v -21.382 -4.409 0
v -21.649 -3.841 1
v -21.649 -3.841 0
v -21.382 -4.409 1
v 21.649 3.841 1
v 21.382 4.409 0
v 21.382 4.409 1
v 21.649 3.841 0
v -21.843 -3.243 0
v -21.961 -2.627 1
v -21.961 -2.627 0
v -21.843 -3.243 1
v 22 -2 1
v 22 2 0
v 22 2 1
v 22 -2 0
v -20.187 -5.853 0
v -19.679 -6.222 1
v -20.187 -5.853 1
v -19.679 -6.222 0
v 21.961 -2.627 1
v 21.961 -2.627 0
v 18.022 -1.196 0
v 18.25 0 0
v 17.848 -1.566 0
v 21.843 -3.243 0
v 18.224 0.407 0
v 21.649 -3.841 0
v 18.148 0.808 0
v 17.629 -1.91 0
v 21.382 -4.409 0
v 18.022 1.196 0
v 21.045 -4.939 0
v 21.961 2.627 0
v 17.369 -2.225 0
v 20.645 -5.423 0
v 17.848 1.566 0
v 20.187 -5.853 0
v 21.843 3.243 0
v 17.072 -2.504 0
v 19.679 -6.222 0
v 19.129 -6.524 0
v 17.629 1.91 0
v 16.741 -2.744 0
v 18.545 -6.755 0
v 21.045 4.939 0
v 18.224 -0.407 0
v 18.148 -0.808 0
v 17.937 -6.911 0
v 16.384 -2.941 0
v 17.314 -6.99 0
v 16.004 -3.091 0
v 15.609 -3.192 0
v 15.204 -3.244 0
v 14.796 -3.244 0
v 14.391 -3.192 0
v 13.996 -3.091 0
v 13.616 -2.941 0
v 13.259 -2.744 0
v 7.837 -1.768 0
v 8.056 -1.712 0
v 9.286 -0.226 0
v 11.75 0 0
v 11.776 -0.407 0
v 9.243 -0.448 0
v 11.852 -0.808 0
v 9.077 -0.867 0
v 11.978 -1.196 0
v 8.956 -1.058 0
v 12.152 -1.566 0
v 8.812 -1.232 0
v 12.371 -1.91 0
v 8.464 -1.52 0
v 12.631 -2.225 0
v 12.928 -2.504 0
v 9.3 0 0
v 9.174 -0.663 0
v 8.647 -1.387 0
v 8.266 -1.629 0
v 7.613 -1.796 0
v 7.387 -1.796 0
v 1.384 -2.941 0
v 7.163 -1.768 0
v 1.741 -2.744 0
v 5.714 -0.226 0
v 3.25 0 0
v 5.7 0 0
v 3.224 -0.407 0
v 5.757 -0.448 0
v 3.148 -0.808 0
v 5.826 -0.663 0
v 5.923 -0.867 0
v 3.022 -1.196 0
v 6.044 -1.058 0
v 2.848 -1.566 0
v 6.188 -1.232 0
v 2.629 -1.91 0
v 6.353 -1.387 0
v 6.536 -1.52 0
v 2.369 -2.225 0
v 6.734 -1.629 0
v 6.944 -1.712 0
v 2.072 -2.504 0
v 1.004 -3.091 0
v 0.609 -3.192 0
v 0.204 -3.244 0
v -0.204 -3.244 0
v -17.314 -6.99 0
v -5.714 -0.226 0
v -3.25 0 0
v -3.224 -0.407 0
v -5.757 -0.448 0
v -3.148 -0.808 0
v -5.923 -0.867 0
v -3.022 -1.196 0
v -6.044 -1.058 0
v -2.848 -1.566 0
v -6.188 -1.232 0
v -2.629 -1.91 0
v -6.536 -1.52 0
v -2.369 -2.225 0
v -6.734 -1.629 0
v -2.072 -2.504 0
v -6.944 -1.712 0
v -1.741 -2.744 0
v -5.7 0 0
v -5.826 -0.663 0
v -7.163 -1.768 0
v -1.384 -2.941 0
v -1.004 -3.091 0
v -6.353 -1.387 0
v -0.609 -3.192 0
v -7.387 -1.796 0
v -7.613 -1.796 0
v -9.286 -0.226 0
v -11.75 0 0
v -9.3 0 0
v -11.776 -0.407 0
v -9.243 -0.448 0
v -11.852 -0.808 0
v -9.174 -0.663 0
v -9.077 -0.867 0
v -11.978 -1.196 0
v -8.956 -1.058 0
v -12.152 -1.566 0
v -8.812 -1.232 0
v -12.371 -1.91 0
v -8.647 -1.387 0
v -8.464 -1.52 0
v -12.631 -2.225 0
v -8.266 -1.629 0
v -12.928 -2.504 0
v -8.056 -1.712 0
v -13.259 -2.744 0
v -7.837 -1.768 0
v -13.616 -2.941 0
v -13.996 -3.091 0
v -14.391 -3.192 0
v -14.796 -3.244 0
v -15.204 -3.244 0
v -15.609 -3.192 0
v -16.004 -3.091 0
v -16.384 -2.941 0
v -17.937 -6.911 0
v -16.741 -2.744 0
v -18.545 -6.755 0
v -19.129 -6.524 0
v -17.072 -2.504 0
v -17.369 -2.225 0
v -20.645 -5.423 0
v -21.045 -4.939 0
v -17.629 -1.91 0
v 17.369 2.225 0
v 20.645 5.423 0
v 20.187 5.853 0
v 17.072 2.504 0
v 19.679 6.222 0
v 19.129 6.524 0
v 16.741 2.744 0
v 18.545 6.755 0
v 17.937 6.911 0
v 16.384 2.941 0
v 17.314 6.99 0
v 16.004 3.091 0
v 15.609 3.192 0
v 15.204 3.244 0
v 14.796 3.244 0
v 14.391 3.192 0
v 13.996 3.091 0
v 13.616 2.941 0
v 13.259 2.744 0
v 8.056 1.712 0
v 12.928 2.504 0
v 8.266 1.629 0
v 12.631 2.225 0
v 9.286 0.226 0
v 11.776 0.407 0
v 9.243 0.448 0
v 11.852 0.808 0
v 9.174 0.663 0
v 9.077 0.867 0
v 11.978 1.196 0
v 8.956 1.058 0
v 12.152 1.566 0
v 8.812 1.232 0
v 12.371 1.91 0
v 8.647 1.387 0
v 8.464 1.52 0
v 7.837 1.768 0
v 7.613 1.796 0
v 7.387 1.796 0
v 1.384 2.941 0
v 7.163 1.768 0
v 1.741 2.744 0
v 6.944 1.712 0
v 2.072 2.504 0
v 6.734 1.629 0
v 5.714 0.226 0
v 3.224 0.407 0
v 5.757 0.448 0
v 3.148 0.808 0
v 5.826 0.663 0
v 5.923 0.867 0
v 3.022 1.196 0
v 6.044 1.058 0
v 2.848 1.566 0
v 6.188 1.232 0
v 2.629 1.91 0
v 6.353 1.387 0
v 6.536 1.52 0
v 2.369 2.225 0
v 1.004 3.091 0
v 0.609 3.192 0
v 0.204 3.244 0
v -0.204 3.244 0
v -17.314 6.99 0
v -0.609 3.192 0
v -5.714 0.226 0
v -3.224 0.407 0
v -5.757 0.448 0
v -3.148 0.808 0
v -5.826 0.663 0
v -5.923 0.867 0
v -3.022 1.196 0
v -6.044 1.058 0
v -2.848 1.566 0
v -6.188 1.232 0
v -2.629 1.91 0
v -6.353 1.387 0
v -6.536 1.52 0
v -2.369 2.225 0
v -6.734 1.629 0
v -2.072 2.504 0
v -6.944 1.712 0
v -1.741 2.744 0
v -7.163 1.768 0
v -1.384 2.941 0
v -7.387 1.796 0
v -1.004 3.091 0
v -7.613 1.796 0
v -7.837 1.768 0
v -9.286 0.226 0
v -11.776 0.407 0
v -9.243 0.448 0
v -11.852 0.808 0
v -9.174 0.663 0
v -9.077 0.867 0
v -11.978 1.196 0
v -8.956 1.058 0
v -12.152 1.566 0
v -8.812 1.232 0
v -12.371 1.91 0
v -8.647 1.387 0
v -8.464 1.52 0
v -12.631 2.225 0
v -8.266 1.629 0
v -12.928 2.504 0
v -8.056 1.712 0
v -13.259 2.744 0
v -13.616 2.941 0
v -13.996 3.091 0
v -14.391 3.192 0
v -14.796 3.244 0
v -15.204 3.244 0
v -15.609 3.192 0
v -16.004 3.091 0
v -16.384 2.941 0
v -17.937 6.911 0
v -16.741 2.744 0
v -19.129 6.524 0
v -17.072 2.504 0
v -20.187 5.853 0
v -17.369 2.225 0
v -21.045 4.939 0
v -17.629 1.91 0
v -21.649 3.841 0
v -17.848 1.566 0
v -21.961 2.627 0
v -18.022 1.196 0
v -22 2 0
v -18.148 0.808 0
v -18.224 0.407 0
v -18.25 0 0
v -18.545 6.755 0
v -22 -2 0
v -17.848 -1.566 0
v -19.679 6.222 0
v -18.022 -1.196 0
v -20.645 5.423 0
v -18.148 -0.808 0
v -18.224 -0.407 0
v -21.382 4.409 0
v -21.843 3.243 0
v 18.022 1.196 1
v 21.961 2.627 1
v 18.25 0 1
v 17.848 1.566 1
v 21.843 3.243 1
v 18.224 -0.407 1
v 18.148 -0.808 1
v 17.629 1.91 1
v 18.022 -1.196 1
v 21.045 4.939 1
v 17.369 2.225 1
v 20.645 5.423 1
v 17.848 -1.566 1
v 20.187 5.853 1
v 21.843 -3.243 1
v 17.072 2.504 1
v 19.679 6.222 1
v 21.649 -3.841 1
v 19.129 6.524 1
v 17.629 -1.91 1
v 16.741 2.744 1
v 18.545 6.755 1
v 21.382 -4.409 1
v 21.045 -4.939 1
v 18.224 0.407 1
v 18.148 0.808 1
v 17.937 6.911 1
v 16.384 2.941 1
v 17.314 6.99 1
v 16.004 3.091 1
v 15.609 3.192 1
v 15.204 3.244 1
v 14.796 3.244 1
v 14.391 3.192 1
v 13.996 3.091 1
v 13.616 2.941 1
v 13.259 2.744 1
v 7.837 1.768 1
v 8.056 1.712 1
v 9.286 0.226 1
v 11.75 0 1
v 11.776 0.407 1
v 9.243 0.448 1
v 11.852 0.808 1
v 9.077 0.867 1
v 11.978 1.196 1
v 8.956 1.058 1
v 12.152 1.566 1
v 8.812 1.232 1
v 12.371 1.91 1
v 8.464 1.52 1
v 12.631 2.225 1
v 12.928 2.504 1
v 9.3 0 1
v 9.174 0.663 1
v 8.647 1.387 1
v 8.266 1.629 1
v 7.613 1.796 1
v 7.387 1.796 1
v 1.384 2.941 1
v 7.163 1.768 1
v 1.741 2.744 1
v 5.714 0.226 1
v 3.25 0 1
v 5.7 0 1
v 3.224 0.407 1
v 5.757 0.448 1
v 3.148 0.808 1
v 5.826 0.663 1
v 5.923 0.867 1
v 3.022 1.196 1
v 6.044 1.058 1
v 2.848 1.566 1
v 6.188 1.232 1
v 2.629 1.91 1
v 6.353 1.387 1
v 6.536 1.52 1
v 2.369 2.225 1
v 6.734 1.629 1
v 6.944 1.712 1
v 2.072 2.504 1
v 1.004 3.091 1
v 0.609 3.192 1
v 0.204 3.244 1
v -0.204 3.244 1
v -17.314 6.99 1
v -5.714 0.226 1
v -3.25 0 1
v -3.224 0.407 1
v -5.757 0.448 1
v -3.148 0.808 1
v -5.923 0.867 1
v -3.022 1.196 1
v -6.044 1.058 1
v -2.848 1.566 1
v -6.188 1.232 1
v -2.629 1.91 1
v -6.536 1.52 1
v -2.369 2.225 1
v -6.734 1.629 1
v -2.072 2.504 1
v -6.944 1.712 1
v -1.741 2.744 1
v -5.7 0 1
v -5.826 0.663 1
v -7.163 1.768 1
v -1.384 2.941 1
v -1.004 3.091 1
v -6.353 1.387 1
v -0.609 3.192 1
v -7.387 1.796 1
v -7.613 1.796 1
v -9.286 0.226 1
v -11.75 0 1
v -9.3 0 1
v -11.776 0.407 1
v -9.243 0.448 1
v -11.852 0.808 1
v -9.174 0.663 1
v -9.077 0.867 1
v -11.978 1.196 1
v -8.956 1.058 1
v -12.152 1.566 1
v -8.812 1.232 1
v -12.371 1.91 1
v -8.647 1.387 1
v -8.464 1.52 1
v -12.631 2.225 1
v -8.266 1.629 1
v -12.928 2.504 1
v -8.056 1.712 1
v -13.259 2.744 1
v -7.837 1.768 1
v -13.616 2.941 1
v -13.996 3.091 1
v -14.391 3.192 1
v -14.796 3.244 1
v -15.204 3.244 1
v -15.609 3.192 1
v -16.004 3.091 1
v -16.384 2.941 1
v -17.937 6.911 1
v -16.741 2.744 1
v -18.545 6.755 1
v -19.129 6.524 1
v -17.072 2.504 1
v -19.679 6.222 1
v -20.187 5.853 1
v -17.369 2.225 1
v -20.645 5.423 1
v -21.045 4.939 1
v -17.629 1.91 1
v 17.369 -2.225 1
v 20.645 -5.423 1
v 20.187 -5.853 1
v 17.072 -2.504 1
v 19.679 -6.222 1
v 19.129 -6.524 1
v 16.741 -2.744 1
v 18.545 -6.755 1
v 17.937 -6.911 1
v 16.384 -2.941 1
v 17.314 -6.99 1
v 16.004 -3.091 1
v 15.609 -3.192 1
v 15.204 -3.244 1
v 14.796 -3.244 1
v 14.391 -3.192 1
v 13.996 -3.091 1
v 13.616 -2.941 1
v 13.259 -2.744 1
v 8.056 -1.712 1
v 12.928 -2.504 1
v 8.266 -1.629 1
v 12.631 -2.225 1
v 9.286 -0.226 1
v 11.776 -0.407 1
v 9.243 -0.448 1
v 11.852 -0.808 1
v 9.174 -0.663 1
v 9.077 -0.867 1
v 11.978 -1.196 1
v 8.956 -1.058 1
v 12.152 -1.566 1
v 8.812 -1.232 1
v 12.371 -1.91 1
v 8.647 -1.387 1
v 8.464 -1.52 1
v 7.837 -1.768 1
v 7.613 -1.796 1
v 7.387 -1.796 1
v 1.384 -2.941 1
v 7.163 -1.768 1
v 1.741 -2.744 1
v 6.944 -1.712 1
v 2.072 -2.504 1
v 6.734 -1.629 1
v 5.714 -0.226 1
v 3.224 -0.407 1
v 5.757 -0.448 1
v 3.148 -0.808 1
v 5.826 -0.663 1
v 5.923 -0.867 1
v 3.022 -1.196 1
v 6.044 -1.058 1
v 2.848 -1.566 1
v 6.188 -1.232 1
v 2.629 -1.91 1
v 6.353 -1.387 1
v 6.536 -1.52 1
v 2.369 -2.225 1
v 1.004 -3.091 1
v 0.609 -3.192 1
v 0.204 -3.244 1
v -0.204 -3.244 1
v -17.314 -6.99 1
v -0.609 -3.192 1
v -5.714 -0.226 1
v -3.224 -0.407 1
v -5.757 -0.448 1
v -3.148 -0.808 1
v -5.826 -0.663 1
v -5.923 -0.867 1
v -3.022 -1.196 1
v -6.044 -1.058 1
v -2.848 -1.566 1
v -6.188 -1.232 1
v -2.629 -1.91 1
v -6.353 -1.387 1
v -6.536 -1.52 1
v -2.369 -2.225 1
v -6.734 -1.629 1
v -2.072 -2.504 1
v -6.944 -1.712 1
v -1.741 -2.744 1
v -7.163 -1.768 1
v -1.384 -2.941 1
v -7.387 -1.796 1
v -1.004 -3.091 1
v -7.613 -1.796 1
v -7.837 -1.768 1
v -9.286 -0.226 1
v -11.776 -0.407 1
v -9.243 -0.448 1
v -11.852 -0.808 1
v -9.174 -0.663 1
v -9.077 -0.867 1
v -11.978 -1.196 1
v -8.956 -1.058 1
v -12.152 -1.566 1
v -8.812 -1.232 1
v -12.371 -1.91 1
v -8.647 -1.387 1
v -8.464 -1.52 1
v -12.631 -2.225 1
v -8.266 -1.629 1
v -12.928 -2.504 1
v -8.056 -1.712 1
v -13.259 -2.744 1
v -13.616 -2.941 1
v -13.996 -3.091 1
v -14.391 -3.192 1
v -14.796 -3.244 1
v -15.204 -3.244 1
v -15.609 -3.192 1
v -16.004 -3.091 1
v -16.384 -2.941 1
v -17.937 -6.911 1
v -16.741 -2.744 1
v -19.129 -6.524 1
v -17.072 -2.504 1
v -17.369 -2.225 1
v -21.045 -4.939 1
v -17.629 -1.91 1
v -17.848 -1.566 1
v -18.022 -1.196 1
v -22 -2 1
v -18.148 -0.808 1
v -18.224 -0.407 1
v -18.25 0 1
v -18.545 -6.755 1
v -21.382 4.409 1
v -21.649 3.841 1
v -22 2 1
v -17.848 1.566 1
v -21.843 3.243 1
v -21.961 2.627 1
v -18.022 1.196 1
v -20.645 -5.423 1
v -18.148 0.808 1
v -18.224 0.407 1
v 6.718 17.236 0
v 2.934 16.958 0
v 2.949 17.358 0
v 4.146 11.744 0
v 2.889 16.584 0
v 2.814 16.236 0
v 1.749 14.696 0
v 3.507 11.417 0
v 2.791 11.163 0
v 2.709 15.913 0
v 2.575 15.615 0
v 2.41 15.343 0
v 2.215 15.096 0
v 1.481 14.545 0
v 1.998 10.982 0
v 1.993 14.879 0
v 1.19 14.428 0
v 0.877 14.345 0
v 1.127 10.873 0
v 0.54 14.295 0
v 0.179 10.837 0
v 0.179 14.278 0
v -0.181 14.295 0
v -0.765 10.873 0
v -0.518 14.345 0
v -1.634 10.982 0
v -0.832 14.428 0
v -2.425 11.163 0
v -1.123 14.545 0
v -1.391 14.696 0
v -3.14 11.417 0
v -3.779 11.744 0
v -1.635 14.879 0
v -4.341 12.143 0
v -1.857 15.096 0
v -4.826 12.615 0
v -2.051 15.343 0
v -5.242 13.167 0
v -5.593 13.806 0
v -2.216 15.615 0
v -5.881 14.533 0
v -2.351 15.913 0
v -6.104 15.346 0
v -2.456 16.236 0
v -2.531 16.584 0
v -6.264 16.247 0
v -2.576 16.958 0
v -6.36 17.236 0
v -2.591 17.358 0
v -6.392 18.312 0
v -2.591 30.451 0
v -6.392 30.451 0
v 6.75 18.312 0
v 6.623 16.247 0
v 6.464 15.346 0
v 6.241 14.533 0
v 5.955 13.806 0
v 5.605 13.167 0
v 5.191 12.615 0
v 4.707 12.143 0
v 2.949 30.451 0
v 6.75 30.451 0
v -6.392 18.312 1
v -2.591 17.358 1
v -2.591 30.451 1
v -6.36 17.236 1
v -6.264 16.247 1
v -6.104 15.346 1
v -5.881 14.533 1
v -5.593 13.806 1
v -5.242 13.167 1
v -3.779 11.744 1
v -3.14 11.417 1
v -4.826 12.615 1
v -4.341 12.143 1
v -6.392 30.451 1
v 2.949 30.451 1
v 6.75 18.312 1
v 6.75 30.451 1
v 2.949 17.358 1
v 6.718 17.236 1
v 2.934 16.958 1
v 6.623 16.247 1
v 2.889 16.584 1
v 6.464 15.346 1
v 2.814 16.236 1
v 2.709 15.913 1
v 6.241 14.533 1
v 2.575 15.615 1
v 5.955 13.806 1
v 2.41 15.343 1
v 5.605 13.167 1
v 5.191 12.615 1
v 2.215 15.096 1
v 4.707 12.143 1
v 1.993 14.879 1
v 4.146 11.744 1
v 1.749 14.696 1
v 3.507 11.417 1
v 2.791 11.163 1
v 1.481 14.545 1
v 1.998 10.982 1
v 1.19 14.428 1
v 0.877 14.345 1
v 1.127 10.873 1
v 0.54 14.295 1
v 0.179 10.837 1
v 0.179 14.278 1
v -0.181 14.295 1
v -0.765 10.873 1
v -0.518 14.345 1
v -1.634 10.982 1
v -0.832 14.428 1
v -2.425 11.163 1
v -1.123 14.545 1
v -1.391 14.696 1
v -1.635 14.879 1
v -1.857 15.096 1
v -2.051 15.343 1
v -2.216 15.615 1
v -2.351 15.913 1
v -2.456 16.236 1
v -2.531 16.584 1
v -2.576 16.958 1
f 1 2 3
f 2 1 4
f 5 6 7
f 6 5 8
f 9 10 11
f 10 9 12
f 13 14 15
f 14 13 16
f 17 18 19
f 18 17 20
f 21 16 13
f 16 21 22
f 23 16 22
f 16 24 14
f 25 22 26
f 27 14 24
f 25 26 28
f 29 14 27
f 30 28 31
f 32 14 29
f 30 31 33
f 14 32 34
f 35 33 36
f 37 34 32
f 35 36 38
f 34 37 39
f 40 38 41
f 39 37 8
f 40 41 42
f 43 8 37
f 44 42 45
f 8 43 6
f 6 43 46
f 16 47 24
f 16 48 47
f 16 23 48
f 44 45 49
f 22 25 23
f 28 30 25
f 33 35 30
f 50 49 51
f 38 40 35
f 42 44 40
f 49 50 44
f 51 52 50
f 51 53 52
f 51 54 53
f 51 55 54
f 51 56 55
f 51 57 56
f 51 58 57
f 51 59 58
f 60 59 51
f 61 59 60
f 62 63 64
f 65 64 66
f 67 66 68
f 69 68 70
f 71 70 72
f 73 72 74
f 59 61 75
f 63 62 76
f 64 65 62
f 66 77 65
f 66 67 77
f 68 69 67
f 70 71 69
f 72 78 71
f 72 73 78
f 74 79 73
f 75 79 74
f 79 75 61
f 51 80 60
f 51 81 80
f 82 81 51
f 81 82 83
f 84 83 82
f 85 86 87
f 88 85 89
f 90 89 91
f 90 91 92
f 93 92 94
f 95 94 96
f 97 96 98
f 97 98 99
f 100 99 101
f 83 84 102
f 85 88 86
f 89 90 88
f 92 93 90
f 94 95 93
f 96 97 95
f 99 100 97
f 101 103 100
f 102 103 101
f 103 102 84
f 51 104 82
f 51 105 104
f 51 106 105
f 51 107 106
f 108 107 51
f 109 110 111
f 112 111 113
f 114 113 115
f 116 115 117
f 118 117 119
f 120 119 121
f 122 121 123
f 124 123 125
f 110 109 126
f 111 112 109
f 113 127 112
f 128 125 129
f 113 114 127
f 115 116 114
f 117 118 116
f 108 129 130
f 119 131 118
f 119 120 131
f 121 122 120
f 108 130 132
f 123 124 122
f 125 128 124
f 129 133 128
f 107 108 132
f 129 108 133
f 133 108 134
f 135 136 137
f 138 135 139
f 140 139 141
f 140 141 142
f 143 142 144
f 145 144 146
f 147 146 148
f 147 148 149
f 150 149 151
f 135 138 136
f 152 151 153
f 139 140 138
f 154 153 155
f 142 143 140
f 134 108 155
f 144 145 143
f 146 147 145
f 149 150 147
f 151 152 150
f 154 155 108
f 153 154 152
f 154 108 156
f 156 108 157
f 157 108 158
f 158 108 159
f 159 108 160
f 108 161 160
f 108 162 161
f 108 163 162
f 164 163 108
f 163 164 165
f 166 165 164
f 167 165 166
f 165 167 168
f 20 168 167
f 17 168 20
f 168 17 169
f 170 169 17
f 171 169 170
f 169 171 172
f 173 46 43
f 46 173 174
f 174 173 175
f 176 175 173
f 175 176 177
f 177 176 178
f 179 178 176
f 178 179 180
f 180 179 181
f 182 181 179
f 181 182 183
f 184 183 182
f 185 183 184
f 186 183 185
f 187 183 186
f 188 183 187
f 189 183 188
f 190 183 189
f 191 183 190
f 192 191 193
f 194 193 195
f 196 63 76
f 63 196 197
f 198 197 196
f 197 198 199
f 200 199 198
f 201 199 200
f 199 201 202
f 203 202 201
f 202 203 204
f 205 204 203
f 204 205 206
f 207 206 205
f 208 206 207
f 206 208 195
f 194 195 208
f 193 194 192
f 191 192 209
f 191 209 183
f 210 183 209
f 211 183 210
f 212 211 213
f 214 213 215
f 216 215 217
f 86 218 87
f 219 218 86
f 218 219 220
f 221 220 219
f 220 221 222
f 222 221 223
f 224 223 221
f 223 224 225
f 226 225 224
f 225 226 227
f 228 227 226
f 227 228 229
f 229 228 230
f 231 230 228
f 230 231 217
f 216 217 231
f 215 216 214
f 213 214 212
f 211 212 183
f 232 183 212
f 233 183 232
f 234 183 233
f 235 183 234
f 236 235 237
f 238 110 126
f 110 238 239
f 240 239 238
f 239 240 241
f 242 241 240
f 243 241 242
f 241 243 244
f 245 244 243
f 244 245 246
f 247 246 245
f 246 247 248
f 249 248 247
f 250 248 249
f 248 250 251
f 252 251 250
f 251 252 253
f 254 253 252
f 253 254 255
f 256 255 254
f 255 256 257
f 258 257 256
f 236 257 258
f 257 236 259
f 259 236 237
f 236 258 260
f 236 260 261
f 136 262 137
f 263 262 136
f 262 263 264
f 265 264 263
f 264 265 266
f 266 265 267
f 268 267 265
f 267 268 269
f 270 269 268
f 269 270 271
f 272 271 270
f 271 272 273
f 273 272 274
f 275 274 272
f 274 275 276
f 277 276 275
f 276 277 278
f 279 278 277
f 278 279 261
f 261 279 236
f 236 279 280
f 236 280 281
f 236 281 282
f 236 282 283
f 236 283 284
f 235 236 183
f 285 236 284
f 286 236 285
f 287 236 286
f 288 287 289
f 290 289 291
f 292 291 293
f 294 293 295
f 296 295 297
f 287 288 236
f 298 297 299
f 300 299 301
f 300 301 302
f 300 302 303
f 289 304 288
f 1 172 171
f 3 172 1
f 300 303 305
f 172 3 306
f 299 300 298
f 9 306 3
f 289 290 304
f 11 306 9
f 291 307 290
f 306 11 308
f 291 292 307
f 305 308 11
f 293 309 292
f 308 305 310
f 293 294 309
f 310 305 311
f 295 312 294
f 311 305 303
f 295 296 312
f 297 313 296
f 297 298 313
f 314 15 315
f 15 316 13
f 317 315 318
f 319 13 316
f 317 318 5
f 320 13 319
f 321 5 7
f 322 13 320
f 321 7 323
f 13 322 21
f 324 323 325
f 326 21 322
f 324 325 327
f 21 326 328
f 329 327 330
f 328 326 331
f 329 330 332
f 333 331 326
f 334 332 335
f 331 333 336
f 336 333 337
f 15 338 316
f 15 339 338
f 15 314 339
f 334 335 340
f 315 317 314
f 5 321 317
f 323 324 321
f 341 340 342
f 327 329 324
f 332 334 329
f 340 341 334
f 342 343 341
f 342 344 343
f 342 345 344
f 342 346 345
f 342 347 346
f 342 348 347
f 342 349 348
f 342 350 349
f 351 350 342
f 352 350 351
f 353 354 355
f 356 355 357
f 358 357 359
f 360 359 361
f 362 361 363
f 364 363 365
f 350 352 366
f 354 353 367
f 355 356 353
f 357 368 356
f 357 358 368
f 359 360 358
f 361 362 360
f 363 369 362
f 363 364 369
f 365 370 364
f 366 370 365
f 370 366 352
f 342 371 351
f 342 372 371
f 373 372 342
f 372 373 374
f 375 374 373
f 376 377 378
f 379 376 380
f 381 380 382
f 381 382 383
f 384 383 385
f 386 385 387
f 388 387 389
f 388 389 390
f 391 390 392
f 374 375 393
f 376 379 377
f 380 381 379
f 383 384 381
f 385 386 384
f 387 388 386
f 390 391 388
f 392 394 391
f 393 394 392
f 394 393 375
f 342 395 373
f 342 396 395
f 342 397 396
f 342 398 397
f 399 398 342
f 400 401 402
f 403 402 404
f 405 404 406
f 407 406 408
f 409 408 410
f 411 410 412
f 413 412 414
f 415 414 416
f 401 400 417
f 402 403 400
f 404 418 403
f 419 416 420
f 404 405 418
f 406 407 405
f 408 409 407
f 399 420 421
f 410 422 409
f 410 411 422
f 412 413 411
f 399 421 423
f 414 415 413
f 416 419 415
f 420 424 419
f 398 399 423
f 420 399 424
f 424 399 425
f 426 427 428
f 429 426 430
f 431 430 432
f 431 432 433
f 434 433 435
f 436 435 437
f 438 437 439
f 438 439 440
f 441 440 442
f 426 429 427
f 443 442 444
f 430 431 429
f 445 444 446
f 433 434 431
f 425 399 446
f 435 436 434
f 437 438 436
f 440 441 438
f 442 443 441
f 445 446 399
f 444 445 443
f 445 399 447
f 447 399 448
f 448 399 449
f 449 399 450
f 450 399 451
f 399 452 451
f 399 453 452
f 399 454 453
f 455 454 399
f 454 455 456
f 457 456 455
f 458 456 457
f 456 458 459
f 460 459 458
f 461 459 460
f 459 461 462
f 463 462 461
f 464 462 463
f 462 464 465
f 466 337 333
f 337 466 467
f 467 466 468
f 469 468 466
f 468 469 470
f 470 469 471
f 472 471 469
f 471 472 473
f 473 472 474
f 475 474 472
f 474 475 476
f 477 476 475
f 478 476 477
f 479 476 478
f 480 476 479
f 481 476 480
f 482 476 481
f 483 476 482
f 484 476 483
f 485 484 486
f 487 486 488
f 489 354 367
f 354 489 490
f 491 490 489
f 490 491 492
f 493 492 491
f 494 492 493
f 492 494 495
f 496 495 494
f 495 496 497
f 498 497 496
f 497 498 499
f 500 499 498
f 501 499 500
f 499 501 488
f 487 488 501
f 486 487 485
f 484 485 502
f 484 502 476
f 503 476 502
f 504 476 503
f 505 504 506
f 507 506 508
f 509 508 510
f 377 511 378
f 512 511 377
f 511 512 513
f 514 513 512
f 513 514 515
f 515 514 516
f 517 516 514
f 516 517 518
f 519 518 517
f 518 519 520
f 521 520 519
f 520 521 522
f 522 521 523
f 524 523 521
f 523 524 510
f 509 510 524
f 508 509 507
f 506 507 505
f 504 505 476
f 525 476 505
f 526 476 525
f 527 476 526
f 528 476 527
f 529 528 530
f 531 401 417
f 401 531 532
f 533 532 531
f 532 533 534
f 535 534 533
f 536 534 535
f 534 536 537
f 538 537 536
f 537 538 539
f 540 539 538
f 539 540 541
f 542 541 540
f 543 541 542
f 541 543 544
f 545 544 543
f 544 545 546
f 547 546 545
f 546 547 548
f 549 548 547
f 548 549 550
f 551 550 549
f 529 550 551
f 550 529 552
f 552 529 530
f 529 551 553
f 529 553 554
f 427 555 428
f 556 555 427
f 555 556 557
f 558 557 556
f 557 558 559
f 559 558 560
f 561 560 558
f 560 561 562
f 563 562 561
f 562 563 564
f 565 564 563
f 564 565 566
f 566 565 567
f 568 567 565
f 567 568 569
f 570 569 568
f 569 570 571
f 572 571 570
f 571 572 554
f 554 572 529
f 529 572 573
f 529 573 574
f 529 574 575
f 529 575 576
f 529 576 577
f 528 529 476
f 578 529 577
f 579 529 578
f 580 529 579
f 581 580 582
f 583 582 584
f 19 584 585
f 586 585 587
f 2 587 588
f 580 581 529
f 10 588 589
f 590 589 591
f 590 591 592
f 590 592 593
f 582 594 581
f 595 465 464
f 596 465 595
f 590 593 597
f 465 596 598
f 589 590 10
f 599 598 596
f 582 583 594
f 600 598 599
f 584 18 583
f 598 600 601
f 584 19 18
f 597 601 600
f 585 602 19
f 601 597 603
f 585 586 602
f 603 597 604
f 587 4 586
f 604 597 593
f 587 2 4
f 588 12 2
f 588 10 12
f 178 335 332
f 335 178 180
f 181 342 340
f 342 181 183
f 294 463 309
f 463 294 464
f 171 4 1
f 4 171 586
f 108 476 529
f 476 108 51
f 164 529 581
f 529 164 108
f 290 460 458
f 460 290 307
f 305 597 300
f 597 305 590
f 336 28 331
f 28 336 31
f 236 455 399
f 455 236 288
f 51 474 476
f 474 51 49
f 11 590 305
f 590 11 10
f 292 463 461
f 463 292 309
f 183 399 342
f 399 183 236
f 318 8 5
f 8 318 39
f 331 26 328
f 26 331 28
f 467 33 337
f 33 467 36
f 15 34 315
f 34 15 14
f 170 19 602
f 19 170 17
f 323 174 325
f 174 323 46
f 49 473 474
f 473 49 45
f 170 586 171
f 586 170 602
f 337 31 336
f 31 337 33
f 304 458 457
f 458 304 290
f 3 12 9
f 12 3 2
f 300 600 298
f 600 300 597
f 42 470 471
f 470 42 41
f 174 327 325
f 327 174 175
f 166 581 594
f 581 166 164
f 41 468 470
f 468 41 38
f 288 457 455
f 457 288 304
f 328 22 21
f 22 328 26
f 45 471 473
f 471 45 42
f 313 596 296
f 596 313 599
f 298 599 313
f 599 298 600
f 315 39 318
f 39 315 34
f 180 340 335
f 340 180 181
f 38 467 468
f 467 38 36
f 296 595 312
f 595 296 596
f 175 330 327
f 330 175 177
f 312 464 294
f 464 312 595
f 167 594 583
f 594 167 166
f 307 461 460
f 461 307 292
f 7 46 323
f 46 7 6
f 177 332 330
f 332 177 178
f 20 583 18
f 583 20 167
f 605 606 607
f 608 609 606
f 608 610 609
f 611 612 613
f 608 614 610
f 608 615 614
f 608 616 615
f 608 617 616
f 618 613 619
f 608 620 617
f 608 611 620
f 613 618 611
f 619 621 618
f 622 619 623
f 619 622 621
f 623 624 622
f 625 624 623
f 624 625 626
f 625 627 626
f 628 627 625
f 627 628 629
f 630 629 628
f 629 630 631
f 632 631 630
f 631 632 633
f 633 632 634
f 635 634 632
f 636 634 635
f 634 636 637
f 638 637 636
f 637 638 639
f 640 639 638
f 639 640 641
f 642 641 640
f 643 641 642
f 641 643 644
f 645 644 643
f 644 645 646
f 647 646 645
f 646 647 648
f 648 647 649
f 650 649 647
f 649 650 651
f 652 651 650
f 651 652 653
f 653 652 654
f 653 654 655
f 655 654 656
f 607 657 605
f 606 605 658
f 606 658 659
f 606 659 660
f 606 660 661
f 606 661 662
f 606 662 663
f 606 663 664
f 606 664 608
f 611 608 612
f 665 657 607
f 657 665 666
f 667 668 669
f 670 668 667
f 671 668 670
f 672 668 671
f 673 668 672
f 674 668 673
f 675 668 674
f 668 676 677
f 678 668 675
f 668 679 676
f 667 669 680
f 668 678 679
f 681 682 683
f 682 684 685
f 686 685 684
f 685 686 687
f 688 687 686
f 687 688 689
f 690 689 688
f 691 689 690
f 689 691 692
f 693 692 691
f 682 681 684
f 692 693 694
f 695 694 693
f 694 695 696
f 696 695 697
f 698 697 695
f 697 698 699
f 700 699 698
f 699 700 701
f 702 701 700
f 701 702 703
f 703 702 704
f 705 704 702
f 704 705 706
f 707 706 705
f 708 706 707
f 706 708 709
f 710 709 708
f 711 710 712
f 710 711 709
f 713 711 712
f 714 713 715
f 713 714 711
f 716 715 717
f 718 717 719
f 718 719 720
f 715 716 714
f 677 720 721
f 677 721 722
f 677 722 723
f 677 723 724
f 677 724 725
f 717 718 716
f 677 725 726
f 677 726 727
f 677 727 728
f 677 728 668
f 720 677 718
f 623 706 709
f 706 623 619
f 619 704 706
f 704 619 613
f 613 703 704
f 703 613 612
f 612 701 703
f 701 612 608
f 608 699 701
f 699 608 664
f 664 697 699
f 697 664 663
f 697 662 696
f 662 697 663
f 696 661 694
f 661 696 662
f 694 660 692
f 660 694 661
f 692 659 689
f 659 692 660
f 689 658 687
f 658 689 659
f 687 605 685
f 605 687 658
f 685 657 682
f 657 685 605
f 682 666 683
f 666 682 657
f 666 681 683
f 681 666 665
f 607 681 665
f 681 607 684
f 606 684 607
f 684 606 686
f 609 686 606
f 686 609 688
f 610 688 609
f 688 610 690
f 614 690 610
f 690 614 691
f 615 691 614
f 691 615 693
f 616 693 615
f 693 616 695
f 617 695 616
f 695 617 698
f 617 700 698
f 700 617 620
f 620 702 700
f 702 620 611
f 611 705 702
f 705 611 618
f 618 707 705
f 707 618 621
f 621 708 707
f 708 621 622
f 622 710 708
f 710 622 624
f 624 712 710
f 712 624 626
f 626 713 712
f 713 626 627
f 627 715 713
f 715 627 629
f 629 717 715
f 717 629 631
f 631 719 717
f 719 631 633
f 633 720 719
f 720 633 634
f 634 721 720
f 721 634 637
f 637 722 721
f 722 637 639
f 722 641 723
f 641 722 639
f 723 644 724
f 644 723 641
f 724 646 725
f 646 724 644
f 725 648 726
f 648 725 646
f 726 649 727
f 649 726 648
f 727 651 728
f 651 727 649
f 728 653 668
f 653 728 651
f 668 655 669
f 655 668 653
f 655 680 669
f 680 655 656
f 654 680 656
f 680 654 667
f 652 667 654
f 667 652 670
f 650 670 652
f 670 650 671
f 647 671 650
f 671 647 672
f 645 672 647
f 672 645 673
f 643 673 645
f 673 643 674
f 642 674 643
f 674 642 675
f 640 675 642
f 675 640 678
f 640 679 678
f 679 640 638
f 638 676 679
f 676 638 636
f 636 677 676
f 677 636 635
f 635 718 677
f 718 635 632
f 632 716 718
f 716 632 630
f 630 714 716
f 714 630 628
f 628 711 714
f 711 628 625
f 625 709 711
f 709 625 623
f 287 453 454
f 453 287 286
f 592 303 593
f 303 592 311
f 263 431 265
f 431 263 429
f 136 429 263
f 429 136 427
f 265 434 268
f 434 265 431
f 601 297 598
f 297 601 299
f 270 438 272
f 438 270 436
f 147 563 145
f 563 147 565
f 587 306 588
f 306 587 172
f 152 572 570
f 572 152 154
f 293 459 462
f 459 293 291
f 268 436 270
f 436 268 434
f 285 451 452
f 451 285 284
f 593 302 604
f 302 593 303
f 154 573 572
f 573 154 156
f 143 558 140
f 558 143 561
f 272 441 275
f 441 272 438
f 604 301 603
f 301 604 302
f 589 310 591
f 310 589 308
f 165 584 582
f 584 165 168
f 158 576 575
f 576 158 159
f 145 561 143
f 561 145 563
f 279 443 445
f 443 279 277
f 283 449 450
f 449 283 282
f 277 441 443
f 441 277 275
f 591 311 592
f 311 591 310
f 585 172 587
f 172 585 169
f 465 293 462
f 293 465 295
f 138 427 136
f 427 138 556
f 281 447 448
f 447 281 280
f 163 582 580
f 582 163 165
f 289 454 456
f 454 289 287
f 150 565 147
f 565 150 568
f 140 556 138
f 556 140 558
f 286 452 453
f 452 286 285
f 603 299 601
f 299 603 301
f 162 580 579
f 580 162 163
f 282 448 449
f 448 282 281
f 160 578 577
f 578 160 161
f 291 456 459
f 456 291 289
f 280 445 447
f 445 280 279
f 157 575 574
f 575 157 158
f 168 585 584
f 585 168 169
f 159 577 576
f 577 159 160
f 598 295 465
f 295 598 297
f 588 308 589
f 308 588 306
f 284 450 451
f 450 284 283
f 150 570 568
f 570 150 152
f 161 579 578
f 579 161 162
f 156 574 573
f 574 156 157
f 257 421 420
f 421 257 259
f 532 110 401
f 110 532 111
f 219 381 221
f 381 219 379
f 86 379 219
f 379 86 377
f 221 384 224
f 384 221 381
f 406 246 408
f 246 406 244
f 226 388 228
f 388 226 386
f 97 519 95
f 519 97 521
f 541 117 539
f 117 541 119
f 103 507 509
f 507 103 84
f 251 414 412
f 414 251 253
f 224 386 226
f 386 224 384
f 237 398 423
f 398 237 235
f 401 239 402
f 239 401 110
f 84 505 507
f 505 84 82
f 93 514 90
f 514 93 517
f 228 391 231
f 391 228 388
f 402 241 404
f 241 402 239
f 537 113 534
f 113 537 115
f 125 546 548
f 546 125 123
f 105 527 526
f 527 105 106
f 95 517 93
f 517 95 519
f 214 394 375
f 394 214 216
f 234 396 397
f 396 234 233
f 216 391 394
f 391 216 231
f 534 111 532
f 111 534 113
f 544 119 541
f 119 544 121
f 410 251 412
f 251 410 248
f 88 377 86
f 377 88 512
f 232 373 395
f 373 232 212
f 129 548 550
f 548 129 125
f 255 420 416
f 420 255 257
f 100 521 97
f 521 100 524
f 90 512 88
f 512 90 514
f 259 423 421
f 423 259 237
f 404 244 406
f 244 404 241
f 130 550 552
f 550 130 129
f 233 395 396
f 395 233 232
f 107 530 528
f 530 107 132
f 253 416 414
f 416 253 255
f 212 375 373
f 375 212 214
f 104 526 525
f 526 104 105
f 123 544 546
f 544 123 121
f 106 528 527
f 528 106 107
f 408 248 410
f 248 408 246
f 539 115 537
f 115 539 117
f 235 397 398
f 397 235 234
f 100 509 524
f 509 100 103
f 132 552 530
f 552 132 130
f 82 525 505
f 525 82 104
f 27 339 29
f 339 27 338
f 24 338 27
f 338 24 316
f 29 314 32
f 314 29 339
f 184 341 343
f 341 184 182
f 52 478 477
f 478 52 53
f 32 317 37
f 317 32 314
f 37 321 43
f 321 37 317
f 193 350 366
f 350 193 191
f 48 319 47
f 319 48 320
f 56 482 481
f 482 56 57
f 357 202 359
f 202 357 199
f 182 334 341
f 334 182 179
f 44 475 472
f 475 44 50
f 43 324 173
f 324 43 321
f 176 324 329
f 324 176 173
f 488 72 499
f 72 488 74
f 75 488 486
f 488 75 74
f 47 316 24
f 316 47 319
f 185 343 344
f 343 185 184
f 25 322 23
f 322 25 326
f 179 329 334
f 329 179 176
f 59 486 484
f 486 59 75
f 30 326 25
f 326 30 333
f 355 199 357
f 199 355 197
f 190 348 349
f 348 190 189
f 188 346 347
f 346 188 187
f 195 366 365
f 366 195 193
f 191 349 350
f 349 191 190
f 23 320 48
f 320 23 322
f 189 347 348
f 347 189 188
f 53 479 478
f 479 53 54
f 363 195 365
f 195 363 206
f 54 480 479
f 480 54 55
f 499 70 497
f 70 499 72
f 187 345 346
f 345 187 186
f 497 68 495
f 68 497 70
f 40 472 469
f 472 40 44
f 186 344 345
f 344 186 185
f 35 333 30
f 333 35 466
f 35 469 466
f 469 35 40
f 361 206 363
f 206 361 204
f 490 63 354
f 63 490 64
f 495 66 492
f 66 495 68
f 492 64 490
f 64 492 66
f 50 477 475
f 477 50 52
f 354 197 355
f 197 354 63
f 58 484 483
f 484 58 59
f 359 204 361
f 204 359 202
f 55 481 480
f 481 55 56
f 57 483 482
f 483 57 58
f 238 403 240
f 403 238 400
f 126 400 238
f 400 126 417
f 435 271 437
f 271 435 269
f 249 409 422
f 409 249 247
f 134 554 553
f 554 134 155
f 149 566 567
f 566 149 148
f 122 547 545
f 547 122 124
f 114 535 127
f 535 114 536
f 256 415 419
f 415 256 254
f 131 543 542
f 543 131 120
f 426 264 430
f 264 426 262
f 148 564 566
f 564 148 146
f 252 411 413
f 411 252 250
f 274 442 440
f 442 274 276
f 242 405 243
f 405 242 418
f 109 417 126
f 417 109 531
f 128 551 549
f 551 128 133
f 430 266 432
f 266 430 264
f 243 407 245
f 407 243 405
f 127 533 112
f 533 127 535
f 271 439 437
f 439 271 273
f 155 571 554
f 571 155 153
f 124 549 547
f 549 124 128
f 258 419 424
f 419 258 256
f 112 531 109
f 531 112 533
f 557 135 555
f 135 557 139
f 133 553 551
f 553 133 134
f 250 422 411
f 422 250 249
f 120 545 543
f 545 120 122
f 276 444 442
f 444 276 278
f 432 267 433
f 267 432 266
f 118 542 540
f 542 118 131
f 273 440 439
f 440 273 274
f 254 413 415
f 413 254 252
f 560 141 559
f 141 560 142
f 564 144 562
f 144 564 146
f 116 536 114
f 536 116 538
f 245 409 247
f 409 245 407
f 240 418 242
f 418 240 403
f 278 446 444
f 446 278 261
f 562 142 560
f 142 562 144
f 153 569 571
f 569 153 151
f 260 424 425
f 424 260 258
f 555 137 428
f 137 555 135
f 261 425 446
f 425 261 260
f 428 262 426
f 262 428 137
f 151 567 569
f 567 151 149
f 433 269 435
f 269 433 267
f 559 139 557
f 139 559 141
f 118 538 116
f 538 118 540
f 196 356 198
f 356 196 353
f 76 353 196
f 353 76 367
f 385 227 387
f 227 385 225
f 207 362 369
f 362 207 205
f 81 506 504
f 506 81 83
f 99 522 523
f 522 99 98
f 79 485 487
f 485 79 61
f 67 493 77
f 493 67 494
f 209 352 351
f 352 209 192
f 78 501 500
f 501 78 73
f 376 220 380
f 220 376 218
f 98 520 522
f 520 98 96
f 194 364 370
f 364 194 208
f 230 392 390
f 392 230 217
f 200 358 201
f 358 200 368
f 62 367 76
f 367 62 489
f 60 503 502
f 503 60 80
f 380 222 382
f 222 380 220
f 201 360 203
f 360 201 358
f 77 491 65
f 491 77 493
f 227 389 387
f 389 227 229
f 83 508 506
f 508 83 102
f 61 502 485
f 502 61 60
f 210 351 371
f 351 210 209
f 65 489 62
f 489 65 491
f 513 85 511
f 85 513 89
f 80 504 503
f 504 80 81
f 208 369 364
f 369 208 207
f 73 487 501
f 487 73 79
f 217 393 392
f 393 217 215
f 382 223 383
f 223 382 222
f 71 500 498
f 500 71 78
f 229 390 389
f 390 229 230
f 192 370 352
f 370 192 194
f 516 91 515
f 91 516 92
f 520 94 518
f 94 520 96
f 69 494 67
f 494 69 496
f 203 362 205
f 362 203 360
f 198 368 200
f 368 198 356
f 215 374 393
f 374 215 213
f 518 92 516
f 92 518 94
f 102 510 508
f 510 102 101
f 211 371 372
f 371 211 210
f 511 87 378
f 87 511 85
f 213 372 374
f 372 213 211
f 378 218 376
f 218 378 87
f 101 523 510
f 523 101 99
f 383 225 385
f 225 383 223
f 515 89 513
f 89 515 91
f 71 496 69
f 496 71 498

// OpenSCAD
$fn = 50;


difference() {
	union() {
		hull() {
			translate(v = [-17.0000000000, 2.0000000000, 0]) {
				cylinder(h = 1, r = 5);
			}
			translate(v = [17.0000000000, 2.0000000000, 0]) {
				cylinder(h = 1, r = 5);
			}
			translate(v = [-17.0000000000, -2.0000000000, 0]) {
				cylinder(h = 1, r = 5);
			}
			translate(v = [17.0000000000, -2.0000000000, 0]) {
				cylinder(h = 1, r = 5);
			}
		}
		translate(v = [0, 30.0000000000, 0]) {
			linear_extrude(height = 1) {
				text(font = "DejaVu Sans Mono:style=Bold", halign = "center", size = 19.0000000000, text = "U", valign = "top");
			}
		}
	}
	union() {
		translate(v = [-15.0000000000, 0.0000000000, 0]) {
			translate(v = [0, 0, -100]) {
				cylinder(h = 200, r = 3.2500000000);
			}
		}
		translate(v = [0, 0, -100]) {
			cylinder(h = 200, r = 3.2500000000);
		}
		translate(v = [15.0000000000, 0.0000000000, 0]) {
			translate(v = [0, 0, -100]) {
				cylinder(h = 200, r = 3.2500000000);
			}
		}
		translate(v = [-15.0000000000, 0.0000000000, 0]) {
			translate(v = [0, 0, -100]) {
				cylinder(h = 200, r = 1.8000000000);
			}
		}
		translate(v = [-7.5000000000, 0.0000000000, 0]) {
			translate(v = [0, 0, -100]) {
				cylinder(h = 200, r = 1.8000000000);
			}
		}
		translate(v = [0, 0, -100]) {
			cylinder(h = 200, r = 1.8000000000);
		}
		translate(v = [7.5000000000, 0.0000000000, 0]) {
			translate(v = [0, 0, -100]) {
				cylinder(h = 200, r = 1.8000000000);
			}
		}
		translate(v = [15.0000000000, 0.0000000000, 0]) {
			translate(v = [0, 0, -100]) {
				cylinder(h = 200, r = 1.8000000000);
			}
		}
	}
}
